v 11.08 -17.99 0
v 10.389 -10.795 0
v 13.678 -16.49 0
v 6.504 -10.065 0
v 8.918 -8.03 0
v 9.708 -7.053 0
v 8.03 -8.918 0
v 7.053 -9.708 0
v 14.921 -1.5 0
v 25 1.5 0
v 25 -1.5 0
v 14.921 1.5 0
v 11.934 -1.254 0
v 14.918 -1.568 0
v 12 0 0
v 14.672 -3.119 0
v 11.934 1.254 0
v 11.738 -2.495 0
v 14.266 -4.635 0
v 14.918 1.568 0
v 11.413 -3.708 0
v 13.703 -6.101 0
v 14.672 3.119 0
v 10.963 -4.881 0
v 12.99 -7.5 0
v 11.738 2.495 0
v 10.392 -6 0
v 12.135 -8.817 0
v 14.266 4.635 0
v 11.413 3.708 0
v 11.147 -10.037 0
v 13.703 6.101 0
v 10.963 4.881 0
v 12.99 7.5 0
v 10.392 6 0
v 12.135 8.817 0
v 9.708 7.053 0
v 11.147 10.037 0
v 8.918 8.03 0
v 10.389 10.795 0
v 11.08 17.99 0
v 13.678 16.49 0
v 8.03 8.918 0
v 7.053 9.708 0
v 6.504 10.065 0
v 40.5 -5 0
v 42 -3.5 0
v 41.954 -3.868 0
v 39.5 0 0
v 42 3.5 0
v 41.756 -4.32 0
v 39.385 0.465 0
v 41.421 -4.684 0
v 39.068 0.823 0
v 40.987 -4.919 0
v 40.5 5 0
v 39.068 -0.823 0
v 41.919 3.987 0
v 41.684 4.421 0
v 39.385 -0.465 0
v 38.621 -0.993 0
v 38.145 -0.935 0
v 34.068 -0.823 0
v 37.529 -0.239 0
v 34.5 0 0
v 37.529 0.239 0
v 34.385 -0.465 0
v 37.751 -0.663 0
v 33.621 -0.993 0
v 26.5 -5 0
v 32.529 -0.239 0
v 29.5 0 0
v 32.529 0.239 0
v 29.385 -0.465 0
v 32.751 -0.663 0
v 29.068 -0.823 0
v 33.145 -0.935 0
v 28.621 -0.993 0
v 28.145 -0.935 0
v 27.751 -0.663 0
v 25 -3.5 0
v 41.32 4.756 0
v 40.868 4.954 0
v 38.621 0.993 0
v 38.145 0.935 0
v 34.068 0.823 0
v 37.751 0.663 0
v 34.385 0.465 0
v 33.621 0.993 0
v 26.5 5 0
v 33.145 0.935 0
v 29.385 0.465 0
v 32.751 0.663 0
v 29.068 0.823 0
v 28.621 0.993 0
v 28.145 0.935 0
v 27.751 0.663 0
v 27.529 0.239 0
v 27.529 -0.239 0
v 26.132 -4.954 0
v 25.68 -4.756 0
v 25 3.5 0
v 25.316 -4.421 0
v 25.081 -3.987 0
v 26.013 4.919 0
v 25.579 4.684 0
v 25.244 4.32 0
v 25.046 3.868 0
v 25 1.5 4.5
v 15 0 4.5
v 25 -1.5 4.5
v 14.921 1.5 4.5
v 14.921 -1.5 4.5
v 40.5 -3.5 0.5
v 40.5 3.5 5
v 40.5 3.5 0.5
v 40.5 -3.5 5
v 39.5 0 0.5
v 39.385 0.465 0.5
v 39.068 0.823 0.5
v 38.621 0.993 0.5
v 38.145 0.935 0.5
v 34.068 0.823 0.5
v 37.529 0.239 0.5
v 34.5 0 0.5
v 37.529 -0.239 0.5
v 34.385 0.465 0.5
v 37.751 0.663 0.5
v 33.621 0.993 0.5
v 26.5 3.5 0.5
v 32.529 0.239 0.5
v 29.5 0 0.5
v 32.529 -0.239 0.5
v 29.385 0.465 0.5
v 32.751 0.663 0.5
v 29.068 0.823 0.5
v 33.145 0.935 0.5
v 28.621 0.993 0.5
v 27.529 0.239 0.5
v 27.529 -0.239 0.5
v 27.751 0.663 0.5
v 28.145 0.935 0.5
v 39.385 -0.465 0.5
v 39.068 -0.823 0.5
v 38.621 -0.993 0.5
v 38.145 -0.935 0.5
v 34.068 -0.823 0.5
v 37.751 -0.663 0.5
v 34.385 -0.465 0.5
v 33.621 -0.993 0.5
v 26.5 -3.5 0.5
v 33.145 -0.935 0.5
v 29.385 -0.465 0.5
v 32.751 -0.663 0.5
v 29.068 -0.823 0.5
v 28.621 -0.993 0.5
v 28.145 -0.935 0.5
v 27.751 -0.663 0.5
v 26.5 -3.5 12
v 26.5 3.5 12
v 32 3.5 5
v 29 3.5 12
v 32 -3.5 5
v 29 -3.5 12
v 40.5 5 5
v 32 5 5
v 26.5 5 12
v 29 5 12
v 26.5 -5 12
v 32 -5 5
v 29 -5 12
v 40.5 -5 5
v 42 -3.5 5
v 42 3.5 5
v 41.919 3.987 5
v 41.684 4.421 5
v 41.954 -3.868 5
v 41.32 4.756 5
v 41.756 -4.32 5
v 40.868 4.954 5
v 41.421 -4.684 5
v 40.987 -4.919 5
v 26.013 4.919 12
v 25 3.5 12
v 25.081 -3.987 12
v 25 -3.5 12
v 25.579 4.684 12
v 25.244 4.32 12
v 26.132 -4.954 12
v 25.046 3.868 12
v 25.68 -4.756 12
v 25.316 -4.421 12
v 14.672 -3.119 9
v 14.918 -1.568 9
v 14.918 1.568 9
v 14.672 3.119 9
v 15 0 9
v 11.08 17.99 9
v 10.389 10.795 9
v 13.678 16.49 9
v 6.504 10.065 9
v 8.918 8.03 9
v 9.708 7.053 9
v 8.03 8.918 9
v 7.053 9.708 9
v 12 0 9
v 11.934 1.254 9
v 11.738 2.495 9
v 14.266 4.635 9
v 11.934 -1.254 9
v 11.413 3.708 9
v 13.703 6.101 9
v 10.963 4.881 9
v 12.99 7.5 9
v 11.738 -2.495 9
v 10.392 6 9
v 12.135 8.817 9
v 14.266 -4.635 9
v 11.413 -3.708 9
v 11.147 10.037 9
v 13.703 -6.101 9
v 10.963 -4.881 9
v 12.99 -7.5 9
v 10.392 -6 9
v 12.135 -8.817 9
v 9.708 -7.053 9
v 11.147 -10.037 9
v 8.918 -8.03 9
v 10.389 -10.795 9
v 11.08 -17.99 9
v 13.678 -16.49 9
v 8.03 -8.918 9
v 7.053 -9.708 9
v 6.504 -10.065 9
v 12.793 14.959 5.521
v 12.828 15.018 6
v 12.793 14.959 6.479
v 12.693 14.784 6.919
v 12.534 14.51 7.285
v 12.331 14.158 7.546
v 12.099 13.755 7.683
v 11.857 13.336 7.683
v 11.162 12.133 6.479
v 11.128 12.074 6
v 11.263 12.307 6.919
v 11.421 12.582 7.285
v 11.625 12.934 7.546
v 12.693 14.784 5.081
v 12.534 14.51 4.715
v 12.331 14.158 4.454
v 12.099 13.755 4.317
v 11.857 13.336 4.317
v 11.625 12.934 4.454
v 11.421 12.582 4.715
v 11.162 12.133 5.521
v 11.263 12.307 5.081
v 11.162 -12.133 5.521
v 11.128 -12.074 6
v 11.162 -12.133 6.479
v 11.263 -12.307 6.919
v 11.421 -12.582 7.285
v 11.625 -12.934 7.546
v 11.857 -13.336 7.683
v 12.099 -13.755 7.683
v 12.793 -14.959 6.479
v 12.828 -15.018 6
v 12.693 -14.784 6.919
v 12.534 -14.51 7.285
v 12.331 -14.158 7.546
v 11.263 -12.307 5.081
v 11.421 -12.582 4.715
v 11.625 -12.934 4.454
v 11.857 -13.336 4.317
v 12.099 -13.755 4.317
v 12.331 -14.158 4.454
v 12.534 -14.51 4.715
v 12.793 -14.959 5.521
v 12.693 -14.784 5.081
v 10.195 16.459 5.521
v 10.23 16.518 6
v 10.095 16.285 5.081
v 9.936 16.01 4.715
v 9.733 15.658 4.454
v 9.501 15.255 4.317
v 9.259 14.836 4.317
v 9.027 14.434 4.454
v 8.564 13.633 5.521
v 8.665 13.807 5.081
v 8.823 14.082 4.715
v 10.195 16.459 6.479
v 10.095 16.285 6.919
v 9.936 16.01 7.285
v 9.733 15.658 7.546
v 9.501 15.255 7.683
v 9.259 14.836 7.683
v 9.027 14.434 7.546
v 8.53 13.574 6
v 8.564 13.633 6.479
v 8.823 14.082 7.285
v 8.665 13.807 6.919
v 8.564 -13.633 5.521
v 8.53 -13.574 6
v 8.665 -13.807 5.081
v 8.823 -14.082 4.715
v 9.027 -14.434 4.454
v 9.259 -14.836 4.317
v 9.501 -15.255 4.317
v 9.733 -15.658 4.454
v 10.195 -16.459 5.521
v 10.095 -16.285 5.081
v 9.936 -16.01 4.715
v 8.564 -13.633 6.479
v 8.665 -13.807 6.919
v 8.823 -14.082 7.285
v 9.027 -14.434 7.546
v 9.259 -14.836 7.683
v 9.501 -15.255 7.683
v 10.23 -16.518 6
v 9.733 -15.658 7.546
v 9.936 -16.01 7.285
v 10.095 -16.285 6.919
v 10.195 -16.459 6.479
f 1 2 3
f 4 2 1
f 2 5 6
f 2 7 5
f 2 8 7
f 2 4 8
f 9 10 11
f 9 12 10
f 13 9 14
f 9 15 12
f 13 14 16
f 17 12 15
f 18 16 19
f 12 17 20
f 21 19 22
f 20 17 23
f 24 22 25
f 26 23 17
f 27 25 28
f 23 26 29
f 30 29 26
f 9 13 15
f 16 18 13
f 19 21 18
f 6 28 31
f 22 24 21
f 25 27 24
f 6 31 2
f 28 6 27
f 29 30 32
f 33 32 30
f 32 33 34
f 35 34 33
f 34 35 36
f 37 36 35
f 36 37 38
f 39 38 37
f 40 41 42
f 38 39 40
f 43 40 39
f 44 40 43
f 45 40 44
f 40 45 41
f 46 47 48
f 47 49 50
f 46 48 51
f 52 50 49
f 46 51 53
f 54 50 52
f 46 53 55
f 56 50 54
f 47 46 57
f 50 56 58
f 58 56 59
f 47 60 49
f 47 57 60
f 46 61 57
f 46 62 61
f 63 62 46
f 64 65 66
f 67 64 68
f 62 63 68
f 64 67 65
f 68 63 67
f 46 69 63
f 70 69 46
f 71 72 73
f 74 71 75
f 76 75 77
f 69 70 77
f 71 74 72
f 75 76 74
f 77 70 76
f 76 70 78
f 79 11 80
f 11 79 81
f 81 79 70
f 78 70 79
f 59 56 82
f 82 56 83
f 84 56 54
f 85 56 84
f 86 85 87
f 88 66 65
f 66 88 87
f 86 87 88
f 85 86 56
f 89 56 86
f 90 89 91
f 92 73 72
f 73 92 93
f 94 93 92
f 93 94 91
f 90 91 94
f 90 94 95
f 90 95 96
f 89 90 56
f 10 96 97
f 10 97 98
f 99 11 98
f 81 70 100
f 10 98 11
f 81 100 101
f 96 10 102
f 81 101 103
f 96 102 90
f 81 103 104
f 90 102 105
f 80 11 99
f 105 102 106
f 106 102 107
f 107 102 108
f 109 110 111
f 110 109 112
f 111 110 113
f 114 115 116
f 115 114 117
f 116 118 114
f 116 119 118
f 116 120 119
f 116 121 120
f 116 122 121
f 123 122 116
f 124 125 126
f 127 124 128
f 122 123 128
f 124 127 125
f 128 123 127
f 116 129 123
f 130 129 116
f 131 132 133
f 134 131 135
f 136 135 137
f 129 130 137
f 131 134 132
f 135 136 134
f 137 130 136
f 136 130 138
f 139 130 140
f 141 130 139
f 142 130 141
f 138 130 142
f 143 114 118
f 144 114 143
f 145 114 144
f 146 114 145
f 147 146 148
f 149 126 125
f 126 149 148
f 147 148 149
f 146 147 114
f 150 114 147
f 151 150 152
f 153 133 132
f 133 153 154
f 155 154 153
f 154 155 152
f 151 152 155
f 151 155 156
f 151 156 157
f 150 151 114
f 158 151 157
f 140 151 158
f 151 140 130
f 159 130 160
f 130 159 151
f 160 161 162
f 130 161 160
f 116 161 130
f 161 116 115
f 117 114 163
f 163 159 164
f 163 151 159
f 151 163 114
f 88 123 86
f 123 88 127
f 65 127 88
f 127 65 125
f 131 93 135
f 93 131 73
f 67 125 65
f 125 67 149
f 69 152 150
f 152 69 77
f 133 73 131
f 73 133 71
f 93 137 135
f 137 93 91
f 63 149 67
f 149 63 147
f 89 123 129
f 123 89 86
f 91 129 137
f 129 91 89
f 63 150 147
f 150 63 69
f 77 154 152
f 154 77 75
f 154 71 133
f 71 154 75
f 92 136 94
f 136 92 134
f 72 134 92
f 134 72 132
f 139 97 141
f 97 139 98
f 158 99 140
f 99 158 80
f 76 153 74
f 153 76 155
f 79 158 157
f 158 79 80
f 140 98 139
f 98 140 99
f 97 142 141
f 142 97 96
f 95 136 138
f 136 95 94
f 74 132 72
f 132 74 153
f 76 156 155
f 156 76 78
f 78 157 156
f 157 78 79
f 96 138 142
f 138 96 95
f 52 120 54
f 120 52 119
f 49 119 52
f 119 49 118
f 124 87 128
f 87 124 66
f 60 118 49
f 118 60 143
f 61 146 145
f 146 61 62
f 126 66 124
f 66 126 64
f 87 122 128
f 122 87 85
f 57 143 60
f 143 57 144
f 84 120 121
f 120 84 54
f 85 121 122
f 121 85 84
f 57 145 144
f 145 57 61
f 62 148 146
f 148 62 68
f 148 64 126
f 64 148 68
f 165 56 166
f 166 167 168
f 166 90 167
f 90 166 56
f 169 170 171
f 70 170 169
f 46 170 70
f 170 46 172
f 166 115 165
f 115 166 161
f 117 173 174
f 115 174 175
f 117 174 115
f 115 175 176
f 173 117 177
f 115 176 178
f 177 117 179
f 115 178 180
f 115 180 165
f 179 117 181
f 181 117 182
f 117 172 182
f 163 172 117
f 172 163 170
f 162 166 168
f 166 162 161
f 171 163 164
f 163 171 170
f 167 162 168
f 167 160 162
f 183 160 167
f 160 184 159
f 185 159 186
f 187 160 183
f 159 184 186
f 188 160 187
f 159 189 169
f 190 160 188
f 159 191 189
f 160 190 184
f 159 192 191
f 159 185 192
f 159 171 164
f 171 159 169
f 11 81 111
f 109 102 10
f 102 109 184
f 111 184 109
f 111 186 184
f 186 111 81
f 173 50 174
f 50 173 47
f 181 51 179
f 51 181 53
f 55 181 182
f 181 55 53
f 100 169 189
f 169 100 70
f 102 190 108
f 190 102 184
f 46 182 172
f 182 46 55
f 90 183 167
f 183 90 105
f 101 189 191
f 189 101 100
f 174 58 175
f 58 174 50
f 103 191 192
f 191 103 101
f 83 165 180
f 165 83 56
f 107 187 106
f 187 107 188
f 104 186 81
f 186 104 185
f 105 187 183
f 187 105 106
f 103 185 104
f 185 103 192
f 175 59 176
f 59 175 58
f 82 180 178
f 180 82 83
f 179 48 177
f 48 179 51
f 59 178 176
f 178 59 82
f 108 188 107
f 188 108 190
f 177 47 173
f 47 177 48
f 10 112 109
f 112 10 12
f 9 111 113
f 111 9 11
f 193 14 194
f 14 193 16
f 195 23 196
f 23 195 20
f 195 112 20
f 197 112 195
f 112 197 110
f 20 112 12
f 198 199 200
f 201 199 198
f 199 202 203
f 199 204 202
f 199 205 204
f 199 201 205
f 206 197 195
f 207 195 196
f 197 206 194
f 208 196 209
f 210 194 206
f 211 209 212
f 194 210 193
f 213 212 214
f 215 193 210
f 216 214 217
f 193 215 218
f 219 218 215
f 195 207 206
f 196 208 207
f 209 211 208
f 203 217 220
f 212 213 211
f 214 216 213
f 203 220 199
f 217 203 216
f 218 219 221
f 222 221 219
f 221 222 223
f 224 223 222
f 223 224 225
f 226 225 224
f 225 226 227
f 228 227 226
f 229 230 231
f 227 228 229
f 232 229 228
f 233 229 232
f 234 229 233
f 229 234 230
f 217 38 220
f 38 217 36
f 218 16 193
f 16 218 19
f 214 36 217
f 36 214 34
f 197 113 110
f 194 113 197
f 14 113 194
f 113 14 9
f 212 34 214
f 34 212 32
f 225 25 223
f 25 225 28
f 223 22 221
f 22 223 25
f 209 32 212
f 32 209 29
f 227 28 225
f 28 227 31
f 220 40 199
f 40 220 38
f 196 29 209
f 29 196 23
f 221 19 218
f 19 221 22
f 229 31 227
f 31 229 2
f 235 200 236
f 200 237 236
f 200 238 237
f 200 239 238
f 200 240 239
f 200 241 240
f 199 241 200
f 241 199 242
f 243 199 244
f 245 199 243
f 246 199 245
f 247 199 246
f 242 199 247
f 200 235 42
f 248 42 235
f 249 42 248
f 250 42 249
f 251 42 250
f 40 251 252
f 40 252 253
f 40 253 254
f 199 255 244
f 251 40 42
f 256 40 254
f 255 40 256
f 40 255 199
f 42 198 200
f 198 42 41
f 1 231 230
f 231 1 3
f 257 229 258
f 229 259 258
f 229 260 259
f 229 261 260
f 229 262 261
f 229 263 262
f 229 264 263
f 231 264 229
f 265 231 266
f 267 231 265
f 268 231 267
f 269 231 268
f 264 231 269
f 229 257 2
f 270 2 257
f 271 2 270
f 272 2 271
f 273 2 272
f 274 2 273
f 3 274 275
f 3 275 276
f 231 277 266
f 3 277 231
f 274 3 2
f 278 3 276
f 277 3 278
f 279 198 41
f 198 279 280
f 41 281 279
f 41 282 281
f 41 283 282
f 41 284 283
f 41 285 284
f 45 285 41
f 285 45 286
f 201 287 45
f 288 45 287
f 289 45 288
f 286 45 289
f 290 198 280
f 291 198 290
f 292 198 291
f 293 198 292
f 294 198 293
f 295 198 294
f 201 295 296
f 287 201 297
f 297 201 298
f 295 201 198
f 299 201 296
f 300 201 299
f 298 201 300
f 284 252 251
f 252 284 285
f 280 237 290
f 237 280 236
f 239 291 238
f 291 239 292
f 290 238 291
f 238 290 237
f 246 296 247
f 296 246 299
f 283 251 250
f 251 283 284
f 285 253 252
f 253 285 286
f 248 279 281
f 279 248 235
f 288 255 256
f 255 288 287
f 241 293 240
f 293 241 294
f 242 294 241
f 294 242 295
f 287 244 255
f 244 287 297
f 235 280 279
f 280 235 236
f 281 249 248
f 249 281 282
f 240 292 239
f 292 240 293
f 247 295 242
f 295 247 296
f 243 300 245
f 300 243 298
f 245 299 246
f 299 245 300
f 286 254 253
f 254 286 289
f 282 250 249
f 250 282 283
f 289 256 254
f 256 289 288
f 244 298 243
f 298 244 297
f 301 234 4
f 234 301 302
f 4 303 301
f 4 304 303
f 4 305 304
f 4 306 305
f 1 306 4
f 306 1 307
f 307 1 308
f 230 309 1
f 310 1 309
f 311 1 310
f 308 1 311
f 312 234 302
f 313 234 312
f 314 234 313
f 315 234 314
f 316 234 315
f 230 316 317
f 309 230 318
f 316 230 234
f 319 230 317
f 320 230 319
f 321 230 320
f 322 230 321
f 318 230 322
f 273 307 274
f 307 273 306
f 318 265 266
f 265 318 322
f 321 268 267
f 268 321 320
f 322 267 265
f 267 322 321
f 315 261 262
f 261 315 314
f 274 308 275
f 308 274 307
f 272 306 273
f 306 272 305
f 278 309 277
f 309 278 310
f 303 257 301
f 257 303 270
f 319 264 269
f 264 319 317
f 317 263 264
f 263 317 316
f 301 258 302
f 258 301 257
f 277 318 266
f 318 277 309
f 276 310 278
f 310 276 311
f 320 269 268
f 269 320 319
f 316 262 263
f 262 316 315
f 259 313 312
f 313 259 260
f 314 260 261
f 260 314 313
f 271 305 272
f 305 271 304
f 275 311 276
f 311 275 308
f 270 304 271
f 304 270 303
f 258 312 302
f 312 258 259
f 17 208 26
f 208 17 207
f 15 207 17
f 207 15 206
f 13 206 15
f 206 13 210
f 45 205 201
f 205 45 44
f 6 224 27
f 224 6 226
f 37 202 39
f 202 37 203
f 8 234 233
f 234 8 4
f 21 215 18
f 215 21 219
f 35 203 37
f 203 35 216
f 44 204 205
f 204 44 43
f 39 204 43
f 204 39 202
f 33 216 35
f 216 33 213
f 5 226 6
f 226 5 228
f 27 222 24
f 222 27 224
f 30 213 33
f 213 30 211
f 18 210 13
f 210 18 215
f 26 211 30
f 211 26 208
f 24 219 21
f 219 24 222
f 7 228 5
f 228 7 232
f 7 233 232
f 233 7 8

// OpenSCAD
$fa = 6; // minimum angle, default 12deg
$fs = 0.5; // minimum size default 2 mm

onlyOne = true;

dHousing = 24;
thickness = 3;
dScrew = 3.4;  // M3
gap = 1.2;
h0 = 9;

armLength = 25;
armWidth = 3;

switchLength = 14;
switchWidth = 6+1;
switchHeight = 7;
switchHoleDiam = 2;
switchHoleSpace = 5;

holderWalls = 1.5;
holderLength = switchLength + 2*holderWalls;
holderWidth = switchWidth + 2*holderWalls;
holderShoulderHeight = switchHeight + 5;
holderShoulderLength = 7;

R = dHousing/2 + thickness + 1.8*dScrew;
r = dHousing/2 + thickness + 0.8*dScrew;

module switch_holder() {
    union() {
        // holder arm
        translate([ 0, -armWidth/2, 0 ]) 
            cube([ armLength+1, armWidth, h0/2 ]);
        
        // holder itself
        translate([ armLength, 0, 0 ]) 
        intersection() {
            difference() {
                union() {
                    translate([ 0, holderWidth/2, 0 ]) 
                    rotate([ 90, 0, 0 ])
                        linear_extrude(height = holderWidth)
                            polygon(points = [[ 0, 0 ], 
                                [ holderLength, 0], 
                                [ holderLength, 5 ],
                                [ holderShoulderLength, 5 ], 
                                [ 4, holderShoulderHeight ], 
                                [ 0, holderShoulderHeight ]]);
                    
                }
                
                union() {
                    translate([ holderWalls, -switchWidth/2, 0.5 ]) 
                        cube([ switchLength, switchWidth, switchHeight*2 ]);
                    translate([ holderLength/2, 0, -1 ]) 
                        cylinder(h=3, d=switchHoleDiam);
                    translate([ holderLength/2-switchHoleSpace, 0, -1 ]) 
                        cylinder(h=3, d=switchHoleDiam);
                    translate([ holderLength/2+switchHoleSpace, 0, -1 ]) 
                        cylinder(h=3, d=switchHoleDiam);
                }
            }
            
            translate([ holderWalls, -switchWidth/2, -2*holderWalls ]) 
                linear_extrude(height = switchHeight*3)            
                    offset(r=holderWalls)
                        square([ switchLength, switchWidth ]);

        }
    }
}


module screw_join_add() {
    
    translate([ 0, -thickness-gap/2, 0 ]) 
        cube([ R, 2*thickness+gap, h0 ]);
    
}

module screw_join_remove() {
    translate([ 0, -gap/2, -h0 ]) cube([ R+1, gap, 3*h0 ]);
    rotate([ 90, 0, 0 ]) 
        translate([ r, 2*h0/3, -2*thickness ]) 
        cylinder(h=4*thickness, d=dScrew);
}

module laser_attachment() {
    difference() {

        union() {
            cylinder(h=h0, d=dHousing+2*thickness);
            rotate([ 0, 0, +120 ]) switch_holder();
            rotate([ 0, 0,  0.0 ]) switch_holder();
            rotate([ 0, 0, -120 ]) switch_holder();
            rotate([ 0, 0, +60 ]) screw_join_add();
            rotate([ 0, 0, 180 ]) screw_join_add();
            rotate([ 0, 0, -60 ]) screw_join_add();         
        }

        union() {
            translate([0, 0, -h0]) cylinder(h=h0*3, d=dHousing);
            rotate([ 0, 0, +60 ]) screw_join_remove();
            rotate([ 0, 0, 180 ]) screw_join_remove();
            rotate([ 0, 0, -60 ]) screw_join_remove();

            if (onlyOne) {
                rotate([ 0, 0, +60 ]) translate([ -100, 0, -1]) 
                    cube([ 200, 100, 100 ]);
                rotate([ 0, 0, +120 ]) translate([ -100, 0, -1]) 
                    cube([ 200, 100, 100 ]);
            }
        }
    }
}

module cage_disk() {
    
    translate([0, 0, switchHeight]) 
    color([ 0.5,0.5,0, 0.2])
    union() {
        difference() {
            cylinder(h=1, 
                r=armLength+holderLength);
        
            union() {
                translate([0, 0, -1])
                    cylinder(h=3, 
                        r=armLength+gap+holderShoulderLength);
                
                x = armLength+holderShoulderLength
                    +(holderLength-holderShoulderLength)/2;
                for (a = [1:8]) 
                    rotate([ 0, 0, 45*a ])
                    translate([ x, 0, -1 ]) 
                        cylinder(h=3, d=3);

            }
        }
        
        c = 2;
        x = armLength+holderShoulderLength+gap;
        for (a = [1:24]) 
            rotate([ 0, 0, 15*a ])
            translate([ x, 0, 0 ]) 
                rotate([ 0, 0, 45 ])
                    cube([ c, c, 0.5], center=true);
    }    
}

laser_attachment();

if (!onlyOne)
    cage_disk();
